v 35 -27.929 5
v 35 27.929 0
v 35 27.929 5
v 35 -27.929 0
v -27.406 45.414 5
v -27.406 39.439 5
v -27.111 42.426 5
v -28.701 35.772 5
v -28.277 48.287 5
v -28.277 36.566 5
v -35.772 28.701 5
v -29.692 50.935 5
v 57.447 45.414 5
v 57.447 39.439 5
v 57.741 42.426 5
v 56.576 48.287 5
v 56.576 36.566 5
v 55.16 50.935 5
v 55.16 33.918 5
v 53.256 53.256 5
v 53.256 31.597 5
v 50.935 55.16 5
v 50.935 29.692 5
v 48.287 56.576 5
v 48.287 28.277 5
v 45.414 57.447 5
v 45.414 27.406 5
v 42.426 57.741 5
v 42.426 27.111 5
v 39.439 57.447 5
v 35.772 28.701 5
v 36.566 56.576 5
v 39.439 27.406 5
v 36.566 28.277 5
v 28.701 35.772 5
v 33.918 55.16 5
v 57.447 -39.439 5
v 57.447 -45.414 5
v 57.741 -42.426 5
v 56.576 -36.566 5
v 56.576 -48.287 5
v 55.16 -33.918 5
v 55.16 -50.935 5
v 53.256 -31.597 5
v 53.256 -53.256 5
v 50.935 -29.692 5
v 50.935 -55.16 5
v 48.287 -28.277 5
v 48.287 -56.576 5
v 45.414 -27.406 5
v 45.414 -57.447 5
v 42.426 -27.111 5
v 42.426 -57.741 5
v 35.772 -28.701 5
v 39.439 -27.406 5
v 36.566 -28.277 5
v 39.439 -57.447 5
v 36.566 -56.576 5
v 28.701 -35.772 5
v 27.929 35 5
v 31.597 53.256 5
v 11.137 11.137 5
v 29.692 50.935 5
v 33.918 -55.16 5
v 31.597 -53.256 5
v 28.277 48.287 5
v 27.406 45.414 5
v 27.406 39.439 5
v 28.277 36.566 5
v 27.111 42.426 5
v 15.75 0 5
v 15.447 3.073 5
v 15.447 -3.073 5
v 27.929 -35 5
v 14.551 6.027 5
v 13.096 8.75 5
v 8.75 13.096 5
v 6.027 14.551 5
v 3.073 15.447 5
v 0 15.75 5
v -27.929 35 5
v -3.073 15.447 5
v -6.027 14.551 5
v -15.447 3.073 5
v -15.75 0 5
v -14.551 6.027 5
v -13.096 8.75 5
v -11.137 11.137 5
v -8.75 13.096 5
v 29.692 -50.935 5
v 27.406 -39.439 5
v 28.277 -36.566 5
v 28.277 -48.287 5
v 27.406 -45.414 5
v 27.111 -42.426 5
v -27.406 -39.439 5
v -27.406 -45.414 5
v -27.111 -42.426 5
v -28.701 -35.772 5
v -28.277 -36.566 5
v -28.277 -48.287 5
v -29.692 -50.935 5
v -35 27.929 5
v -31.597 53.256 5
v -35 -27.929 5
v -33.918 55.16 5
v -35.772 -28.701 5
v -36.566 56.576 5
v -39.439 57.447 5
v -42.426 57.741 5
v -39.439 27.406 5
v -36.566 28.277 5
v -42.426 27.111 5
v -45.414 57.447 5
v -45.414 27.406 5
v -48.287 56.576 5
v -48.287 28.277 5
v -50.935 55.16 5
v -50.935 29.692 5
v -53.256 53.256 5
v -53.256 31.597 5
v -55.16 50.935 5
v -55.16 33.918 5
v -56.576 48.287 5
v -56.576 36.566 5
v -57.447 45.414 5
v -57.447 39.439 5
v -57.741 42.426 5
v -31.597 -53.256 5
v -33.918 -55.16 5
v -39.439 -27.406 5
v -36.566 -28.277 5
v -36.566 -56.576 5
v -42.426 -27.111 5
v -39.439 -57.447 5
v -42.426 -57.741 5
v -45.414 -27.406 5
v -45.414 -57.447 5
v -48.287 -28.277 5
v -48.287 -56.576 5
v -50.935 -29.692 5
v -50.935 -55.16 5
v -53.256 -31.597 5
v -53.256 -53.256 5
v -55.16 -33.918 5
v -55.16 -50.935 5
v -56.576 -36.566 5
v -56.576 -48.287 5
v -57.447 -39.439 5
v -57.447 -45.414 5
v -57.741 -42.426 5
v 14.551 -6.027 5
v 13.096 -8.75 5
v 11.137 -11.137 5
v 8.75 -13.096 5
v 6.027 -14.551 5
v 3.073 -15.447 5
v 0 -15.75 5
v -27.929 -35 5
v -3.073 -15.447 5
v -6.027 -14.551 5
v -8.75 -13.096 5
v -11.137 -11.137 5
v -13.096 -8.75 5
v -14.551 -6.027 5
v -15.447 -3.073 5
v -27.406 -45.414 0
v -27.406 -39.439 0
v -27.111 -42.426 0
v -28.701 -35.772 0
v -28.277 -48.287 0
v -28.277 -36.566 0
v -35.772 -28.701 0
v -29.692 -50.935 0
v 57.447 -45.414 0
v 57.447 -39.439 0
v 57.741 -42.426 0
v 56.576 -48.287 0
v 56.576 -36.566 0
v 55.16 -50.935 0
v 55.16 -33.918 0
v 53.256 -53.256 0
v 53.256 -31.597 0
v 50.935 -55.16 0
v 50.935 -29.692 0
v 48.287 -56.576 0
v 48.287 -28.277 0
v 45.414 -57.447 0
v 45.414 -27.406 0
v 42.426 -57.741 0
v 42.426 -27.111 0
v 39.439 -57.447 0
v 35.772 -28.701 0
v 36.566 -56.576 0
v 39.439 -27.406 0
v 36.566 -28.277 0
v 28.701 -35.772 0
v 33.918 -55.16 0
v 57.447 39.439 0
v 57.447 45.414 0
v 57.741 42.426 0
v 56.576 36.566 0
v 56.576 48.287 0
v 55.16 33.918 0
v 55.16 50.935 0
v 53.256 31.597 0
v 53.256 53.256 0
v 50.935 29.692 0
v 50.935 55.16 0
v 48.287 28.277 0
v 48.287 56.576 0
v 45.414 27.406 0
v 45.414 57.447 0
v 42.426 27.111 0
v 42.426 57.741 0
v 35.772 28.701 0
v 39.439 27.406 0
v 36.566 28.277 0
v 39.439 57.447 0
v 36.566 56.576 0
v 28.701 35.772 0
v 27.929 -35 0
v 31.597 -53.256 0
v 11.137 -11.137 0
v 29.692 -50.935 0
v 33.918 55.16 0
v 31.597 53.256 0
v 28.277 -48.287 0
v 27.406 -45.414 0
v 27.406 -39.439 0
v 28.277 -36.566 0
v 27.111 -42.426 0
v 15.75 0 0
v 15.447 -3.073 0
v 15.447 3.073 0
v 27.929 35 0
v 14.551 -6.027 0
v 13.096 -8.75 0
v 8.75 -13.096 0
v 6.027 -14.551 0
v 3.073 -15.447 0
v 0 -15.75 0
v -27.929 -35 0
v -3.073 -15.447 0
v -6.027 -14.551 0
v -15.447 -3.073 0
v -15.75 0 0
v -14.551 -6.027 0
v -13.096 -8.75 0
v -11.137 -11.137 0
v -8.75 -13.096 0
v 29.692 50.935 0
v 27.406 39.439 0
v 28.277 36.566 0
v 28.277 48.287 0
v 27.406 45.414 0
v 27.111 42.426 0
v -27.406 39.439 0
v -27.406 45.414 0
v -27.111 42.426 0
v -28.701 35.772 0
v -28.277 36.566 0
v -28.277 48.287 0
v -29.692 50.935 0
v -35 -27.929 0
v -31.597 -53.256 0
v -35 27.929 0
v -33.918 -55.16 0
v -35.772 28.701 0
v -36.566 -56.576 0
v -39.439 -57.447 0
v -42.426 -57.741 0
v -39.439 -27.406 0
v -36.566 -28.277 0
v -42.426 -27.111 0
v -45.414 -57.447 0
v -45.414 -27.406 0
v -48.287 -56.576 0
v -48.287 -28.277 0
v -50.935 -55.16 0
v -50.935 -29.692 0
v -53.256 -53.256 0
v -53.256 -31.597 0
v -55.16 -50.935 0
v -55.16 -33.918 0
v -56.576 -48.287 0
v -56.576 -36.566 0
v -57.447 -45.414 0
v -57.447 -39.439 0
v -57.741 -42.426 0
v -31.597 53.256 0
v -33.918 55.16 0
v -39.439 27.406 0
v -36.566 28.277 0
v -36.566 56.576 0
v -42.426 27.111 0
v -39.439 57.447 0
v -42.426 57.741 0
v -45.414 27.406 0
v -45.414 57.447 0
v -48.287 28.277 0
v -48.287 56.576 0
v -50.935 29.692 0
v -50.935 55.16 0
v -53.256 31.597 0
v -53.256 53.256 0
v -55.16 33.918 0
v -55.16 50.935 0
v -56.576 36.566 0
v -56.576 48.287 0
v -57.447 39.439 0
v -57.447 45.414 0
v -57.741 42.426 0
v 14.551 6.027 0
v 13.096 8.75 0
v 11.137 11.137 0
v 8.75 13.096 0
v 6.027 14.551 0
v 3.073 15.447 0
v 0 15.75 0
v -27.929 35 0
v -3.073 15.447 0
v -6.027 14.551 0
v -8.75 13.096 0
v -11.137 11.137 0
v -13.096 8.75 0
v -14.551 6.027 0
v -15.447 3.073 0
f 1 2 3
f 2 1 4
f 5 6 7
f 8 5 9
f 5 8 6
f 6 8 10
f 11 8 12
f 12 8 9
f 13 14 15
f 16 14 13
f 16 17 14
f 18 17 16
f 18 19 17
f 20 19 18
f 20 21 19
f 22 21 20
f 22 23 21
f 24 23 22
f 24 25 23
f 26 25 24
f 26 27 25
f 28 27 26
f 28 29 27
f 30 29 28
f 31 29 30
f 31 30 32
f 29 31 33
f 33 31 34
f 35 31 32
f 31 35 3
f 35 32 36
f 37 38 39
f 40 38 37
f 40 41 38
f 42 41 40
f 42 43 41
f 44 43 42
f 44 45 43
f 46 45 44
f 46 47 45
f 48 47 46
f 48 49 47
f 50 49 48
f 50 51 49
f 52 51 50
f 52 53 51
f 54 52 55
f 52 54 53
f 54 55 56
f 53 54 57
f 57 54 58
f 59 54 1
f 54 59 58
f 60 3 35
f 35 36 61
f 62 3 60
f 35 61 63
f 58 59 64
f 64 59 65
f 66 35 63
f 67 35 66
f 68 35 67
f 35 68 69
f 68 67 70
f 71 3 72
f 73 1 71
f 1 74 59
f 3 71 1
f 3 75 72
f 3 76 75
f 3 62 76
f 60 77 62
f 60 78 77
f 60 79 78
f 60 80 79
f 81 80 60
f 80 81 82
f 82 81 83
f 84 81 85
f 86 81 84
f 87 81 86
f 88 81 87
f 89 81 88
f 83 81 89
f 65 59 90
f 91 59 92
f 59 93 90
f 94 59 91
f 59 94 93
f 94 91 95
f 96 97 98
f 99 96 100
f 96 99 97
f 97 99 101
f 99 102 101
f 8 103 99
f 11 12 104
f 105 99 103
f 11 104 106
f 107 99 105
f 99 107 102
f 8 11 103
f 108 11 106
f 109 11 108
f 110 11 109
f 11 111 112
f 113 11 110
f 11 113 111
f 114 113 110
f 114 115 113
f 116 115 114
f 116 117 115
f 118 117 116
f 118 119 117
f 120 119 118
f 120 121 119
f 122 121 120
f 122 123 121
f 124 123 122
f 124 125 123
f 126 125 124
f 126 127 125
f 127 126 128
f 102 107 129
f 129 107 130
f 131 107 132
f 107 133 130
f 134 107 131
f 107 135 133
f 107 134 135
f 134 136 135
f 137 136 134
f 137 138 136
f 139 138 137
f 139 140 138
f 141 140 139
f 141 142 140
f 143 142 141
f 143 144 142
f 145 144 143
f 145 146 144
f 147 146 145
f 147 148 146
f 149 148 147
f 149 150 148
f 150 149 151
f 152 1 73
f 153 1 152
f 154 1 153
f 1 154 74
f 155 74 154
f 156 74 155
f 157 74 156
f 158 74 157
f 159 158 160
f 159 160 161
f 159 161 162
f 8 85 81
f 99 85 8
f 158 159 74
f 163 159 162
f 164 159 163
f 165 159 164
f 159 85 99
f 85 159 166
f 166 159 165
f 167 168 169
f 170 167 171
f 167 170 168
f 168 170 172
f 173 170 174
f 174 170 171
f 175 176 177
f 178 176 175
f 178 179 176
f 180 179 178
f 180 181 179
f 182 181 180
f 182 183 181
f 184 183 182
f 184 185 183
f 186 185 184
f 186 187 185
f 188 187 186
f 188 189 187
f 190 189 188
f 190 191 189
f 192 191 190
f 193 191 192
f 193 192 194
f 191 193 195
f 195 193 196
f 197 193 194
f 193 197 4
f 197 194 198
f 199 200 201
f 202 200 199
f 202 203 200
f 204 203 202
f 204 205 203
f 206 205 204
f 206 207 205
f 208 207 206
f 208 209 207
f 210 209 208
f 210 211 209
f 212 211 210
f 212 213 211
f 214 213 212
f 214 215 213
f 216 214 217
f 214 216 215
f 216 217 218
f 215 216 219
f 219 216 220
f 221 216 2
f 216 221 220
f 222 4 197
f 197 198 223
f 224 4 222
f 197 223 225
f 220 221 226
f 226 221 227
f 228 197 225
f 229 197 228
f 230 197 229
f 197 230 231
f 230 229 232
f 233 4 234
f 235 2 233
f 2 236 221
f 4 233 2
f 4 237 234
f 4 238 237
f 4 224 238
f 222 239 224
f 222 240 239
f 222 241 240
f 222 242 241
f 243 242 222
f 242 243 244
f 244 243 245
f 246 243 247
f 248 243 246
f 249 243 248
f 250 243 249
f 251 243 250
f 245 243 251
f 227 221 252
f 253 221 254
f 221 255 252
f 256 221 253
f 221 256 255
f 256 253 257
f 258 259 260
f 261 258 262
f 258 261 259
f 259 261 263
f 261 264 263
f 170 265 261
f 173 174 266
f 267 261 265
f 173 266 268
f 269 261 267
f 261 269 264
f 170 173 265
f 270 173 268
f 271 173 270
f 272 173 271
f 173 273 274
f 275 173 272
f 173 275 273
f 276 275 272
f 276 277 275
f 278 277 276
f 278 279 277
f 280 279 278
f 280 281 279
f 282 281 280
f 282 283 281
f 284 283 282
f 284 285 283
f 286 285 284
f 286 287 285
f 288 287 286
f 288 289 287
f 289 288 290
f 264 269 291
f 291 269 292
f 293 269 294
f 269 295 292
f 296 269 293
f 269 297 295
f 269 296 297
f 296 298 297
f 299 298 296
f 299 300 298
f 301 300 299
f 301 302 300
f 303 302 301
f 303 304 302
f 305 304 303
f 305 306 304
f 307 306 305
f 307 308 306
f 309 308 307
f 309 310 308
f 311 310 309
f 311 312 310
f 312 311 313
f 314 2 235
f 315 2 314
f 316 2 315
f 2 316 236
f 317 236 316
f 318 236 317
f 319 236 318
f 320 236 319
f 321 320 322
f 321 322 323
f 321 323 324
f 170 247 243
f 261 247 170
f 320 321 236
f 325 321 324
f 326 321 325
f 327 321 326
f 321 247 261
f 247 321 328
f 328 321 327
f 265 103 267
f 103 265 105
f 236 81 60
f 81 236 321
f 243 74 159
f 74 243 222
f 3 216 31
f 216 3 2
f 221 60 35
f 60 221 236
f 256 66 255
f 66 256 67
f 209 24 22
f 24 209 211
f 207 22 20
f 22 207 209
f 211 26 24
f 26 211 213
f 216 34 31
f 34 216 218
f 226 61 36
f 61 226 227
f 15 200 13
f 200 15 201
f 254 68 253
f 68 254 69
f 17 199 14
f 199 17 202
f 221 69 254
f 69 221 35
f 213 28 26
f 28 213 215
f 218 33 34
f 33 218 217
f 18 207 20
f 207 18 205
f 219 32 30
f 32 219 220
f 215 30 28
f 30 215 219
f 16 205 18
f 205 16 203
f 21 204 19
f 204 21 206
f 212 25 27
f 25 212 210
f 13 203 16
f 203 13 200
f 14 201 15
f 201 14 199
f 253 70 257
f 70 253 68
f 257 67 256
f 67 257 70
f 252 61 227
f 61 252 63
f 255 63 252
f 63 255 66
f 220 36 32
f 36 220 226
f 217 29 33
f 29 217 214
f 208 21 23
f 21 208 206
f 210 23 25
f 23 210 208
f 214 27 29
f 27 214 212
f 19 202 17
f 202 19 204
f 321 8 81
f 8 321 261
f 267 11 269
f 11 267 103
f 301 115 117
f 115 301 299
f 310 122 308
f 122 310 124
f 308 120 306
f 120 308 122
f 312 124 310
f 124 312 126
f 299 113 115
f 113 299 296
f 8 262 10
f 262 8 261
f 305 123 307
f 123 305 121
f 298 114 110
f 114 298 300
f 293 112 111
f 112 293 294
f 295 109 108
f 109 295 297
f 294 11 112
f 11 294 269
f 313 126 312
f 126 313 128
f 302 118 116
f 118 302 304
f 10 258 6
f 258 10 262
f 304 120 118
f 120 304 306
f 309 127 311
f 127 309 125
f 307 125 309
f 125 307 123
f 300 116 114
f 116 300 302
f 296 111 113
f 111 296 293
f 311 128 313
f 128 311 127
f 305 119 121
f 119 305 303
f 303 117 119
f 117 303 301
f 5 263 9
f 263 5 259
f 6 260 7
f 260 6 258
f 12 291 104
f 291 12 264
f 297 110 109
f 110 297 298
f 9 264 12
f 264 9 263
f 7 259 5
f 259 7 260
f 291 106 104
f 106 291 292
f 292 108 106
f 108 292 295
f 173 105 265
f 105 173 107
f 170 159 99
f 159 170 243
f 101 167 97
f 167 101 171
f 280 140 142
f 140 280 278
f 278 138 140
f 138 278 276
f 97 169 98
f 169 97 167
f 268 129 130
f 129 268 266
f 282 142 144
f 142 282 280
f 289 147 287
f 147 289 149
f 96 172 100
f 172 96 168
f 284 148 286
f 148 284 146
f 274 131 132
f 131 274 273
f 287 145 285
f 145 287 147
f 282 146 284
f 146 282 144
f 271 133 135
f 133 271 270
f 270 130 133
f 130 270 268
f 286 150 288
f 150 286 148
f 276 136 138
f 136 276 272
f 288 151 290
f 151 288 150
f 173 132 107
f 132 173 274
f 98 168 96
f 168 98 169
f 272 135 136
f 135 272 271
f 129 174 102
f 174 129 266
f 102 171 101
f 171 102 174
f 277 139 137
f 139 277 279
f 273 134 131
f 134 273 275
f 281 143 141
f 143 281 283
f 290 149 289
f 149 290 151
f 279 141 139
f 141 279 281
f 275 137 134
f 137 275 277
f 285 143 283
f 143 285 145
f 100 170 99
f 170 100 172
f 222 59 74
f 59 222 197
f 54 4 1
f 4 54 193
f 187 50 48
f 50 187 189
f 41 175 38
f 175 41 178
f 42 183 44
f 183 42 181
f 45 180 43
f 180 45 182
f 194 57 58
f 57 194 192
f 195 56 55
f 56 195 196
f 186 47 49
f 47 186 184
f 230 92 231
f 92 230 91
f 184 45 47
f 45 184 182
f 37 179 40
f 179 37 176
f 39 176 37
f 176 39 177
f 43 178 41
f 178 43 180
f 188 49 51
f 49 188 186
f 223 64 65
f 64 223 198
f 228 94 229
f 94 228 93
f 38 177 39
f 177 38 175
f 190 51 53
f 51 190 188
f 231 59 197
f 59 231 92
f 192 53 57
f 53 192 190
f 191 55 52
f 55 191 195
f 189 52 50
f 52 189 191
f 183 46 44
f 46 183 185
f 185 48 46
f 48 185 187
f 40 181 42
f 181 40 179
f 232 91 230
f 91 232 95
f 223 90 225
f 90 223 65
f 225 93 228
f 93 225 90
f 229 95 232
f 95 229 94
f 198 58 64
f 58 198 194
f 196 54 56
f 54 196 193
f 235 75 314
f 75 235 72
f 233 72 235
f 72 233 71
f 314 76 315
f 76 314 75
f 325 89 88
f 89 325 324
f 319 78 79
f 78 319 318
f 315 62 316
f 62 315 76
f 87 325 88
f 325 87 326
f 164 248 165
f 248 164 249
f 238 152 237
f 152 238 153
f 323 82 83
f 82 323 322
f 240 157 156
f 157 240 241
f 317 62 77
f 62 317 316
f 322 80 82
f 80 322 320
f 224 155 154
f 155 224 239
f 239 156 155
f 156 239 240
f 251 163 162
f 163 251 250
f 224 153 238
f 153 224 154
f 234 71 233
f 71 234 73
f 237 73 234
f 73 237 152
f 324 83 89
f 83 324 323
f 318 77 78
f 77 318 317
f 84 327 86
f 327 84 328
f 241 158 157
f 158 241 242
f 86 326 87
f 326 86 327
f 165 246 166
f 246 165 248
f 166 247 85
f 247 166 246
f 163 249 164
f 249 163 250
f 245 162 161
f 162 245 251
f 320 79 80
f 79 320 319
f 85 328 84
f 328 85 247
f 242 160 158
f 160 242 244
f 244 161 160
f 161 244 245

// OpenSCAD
$fn = 32;

// ----------------------------------------------------------------------
// Quadcopter frame: 150.62 mm across the motor pads, arms 60 mm
// ----------------------------------------------------------------------

// --- parameters (mm) ---
hub = 70;                 // central plate size
plate_t = 5;              // plate thickness
arm_len = 60;             // hub centre to motor pad centre
bar_w = 10;               // arm width
pad_d = 30.63;            // motor pad diameter
centre_d = 31.5;          // central cut-out for the stack

module arm_bar() {
  /* flat bar: hull of a stub inside the hub and a box at the pad */
  hull() {
    translate([hub / 4, 0, plate_t / 2]) cube([bar_w, bar_w, plate_t], center = true);
    translate([arm_len, 0, plate_t / 2]) cube([bar_w, bar_w, plate_t], center = true);
  }
}

module pad() {
  translate([arm_len, 0, 0]) cylinder(h = plate_t, d = pad_d);
}

module frame() {
  translate([-hub / 2, -hub / 2, 0]) cube([hub, hub, plate_t]);
  rotate([0, 0, 45]) arm_bar();
  rotate([0, 0, 45]) pad();
  rotate([0, 0, 135]) arm_bar();
  rotate([0, 0, 135]) pad();
  rotate([0, 0, 225]) arm_bar();
  rotate([0, 0, 225]) pad();
  rotate([0, 0, 315]) arm_bar();
  rotate([0, 0, 315]) pad();
}

difference() {
  frame();
  translate([0, 0, -1]) cylinder(h = plate_t + 2, d = centre_d);
}
